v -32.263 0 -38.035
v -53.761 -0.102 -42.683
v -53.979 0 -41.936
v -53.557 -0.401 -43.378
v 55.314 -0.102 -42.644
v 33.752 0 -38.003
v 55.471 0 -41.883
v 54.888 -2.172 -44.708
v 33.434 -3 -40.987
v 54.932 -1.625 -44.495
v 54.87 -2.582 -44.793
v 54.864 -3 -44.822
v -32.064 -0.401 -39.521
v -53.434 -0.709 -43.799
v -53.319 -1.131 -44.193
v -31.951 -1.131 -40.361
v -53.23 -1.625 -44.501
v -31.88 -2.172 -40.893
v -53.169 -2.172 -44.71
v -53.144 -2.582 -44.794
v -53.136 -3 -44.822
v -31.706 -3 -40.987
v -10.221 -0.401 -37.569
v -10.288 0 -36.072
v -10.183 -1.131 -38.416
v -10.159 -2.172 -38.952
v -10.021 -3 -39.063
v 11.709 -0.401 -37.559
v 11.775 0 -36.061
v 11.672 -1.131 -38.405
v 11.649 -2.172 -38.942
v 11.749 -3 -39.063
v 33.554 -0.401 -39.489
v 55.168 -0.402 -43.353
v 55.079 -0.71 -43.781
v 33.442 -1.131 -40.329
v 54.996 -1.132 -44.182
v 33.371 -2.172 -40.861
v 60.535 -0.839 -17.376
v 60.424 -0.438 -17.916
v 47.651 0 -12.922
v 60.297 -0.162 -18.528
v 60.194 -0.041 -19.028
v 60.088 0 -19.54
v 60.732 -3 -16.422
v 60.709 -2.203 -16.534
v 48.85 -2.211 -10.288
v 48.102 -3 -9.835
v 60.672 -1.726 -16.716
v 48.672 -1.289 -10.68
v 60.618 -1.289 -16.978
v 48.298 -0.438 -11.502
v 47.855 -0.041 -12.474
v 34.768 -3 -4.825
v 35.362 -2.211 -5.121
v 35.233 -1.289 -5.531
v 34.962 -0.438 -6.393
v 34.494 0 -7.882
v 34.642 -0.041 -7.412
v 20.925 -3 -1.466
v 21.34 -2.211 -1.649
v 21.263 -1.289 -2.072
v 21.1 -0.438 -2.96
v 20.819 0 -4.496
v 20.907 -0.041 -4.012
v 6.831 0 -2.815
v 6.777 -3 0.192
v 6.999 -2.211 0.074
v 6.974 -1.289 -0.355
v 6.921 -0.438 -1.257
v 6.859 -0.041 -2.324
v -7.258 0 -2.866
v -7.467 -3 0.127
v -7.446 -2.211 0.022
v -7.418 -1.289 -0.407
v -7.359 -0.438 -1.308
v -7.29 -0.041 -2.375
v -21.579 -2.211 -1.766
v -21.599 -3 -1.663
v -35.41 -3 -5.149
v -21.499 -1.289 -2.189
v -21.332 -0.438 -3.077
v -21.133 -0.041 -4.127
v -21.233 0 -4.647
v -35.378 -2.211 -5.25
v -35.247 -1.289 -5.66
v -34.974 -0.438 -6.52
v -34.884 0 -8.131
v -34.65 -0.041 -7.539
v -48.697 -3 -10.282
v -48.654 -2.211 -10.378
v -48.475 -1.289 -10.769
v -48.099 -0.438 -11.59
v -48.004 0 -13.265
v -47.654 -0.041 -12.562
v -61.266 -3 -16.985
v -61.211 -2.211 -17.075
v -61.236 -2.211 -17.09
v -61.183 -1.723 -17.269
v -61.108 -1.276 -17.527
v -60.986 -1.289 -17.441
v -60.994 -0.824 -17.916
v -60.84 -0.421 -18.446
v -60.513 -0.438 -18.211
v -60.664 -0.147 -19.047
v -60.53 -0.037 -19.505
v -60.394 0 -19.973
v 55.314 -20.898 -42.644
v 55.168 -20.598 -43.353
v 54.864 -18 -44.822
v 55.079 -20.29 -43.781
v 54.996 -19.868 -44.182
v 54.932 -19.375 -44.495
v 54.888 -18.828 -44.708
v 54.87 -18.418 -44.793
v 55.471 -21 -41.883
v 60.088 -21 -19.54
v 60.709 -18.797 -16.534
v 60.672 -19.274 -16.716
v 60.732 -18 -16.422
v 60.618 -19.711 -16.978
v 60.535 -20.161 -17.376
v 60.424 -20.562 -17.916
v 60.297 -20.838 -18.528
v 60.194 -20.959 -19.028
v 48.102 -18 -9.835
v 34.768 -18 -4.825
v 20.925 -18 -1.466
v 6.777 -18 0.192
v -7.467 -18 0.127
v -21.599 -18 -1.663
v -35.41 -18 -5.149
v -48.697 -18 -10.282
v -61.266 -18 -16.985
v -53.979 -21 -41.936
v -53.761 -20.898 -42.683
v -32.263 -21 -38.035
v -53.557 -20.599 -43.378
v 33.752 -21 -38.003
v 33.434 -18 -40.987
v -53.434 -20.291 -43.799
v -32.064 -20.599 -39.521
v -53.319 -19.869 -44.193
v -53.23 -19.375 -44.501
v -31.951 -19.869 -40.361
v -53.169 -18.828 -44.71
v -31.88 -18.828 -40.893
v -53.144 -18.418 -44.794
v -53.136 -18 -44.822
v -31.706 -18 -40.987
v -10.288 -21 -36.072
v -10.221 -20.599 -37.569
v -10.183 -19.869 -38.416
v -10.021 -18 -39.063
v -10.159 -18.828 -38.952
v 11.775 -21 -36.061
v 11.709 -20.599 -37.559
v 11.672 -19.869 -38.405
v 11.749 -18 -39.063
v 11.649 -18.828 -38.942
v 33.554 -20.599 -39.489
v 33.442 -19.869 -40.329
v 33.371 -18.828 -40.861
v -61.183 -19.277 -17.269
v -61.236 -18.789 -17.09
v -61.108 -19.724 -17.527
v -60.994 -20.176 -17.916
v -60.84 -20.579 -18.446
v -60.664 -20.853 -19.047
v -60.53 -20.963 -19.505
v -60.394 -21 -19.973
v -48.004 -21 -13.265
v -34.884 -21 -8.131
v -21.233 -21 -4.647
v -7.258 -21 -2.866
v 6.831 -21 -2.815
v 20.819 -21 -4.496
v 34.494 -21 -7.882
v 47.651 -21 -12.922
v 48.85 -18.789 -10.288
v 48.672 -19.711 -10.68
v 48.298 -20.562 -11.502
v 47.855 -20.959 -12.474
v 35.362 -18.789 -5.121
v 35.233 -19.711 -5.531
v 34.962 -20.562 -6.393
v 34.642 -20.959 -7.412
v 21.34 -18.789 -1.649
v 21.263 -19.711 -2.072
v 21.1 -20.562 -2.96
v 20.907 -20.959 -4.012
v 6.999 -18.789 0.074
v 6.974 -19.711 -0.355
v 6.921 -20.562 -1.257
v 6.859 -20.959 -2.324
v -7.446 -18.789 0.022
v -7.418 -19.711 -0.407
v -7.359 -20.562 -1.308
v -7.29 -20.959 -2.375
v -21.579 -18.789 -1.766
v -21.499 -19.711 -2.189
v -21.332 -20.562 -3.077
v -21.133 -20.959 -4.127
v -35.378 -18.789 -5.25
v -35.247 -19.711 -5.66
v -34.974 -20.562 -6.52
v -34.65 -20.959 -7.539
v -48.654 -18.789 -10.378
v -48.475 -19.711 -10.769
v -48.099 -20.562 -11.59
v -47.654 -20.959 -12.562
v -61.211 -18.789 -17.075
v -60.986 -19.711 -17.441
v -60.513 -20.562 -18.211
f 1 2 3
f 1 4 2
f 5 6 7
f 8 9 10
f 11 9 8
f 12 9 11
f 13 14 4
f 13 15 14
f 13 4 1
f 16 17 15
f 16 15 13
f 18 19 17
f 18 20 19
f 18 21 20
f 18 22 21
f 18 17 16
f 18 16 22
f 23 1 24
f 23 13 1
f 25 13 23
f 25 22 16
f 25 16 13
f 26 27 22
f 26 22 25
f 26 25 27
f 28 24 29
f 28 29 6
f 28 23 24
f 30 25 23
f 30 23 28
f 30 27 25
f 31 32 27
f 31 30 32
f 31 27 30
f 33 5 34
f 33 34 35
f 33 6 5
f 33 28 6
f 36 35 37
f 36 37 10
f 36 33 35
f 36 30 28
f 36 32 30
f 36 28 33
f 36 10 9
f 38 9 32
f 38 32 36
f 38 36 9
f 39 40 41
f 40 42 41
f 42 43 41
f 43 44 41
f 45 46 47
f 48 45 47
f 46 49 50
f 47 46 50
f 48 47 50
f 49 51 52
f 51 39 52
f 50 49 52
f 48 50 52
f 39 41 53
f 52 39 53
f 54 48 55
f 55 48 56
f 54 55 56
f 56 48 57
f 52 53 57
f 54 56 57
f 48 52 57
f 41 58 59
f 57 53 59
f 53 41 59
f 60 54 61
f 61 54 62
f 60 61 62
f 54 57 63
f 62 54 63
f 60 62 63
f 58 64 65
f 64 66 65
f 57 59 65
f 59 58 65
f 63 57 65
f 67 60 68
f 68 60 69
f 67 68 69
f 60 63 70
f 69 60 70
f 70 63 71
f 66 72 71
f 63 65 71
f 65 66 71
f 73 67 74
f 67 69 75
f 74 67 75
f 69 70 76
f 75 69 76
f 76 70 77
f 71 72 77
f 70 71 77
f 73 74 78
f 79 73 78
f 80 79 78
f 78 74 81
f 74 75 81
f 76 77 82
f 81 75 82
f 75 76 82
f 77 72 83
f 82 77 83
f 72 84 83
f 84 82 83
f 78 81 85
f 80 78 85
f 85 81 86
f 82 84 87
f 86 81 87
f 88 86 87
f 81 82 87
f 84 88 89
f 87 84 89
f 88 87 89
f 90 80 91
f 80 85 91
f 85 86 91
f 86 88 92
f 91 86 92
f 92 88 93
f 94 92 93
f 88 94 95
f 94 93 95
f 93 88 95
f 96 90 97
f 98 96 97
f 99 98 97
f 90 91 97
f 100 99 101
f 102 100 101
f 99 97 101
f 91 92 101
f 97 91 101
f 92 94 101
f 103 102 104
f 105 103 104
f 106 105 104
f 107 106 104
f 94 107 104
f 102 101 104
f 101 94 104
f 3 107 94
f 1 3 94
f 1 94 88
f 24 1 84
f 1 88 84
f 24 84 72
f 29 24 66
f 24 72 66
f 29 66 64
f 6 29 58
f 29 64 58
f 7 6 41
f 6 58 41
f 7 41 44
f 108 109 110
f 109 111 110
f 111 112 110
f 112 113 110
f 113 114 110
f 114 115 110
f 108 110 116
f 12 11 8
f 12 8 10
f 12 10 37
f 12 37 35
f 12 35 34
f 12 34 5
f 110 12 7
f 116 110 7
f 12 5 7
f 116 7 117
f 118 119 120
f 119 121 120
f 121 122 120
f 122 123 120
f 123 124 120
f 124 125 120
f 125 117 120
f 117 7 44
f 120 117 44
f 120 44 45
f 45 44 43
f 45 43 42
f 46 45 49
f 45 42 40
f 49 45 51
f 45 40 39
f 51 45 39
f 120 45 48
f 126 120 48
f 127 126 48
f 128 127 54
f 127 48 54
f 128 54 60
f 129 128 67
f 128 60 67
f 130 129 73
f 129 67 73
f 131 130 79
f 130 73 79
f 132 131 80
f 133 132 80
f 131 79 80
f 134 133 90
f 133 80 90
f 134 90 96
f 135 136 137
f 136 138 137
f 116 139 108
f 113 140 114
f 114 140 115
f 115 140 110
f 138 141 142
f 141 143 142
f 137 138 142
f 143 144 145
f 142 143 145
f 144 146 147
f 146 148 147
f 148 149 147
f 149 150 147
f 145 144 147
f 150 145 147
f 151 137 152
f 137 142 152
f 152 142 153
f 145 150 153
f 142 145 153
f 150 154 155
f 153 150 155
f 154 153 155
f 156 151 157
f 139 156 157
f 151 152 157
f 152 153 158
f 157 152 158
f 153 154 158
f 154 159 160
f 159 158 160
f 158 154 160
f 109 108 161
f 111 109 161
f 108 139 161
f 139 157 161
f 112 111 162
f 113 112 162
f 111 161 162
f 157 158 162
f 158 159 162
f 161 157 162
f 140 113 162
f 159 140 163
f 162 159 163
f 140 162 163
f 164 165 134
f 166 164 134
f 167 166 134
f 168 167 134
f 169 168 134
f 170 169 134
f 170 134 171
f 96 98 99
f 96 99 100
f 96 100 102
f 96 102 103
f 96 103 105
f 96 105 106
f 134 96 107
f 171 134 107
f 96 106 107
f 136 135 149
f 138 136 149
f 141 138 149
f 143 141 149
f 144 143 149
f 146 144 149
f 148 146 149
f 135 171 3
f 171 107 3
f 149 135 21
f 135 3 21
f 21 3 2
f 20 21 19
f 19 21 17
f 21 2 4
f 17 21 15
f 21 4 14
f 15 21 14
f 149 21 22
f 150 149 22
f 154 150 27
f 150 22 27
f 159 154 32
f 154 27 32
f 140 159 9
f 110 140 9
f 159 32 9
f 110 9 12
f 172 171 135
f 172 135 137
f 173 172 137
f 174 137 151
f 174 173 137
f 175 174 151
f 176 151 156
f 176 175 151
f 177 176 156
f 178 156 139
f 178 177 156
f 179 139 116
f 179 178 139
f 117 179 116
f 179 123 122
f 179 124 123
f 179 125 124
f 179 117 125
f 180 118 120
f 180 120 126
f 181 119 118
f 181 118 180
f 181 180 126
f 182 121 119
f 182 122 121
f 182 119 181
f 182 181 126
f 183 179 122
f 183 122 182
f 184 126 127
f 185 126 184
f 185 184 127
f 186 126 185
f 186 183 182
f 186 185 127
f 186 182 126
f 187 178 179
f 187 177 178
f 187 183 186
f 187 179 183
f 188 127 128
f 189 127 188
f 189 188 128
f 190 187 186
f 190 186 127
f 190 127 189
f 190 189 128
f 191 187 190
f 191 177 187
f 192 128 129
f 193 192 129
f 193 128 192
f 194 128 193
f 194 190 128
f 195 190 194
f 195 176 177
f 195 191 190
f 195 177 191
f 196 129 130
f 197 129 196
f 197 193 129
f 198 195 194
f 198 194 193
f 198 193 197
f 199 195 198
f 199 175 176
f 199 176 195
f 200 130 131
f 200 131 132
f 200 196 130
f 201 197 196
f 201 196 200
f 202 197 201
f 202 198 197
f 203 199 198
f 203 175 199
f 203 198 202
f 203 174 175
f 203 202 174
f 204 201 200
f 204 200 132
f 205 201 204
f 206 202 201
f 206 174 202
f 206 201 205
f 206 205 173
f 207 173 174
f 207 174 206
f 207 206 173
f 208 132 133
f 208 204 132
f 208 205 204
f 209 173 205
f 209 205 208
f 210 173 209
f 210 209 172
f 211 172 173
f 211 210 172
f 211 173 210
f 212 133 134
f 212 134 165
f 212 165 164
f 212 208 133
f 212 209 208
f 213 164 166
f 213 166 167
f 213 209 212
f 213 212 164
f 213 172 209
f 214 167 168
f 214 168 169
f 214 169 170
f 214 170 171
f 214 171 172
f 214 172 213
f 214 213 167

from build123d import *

# Parameters (mm, degrees)
F1_DEPTH = 21
F2_R     = 3
F3_R     = 3


with BuildPart() as f1:
    # F0 (on Front) → F1 (new body)
    with BuildSketch(Plane.XZ):
        with BuildLine():
            Line((54.864183, -44.821762), (60.732431, -16.421697))
            ThreePointArc((60.732431, -16.421697), (-0.345751, 0.375658), (-61.26627, -16.984813))
            Line((-61.26627, -16.984813), (-53.135817, -44.821762))
            ThreePointArc((-53.135817, -44.821762), (0.864183, -38.821762), (54.864183, -44.821762))
        make_face()
    extrude(amount=F1_DEPTH)

    # F2
    f2_edges = [f1.edges().sort_by_distance(p)[0] for p in [
        (-0.345751, -21, 0.375658),
    ]]
    fillet(f2_edges, radius=F2_R)

    # F3
    f3_edges = [f1.edges().sort_by_distance(p)[0] for p in [
        (-0.345751, 0, 0.375658),
        (0.864183, -21, -38.821762),
        (0.864183, 0, -38.821762),
    ]]
    fillet(f3_edges, radius=F3_R)


solid = f1.part
